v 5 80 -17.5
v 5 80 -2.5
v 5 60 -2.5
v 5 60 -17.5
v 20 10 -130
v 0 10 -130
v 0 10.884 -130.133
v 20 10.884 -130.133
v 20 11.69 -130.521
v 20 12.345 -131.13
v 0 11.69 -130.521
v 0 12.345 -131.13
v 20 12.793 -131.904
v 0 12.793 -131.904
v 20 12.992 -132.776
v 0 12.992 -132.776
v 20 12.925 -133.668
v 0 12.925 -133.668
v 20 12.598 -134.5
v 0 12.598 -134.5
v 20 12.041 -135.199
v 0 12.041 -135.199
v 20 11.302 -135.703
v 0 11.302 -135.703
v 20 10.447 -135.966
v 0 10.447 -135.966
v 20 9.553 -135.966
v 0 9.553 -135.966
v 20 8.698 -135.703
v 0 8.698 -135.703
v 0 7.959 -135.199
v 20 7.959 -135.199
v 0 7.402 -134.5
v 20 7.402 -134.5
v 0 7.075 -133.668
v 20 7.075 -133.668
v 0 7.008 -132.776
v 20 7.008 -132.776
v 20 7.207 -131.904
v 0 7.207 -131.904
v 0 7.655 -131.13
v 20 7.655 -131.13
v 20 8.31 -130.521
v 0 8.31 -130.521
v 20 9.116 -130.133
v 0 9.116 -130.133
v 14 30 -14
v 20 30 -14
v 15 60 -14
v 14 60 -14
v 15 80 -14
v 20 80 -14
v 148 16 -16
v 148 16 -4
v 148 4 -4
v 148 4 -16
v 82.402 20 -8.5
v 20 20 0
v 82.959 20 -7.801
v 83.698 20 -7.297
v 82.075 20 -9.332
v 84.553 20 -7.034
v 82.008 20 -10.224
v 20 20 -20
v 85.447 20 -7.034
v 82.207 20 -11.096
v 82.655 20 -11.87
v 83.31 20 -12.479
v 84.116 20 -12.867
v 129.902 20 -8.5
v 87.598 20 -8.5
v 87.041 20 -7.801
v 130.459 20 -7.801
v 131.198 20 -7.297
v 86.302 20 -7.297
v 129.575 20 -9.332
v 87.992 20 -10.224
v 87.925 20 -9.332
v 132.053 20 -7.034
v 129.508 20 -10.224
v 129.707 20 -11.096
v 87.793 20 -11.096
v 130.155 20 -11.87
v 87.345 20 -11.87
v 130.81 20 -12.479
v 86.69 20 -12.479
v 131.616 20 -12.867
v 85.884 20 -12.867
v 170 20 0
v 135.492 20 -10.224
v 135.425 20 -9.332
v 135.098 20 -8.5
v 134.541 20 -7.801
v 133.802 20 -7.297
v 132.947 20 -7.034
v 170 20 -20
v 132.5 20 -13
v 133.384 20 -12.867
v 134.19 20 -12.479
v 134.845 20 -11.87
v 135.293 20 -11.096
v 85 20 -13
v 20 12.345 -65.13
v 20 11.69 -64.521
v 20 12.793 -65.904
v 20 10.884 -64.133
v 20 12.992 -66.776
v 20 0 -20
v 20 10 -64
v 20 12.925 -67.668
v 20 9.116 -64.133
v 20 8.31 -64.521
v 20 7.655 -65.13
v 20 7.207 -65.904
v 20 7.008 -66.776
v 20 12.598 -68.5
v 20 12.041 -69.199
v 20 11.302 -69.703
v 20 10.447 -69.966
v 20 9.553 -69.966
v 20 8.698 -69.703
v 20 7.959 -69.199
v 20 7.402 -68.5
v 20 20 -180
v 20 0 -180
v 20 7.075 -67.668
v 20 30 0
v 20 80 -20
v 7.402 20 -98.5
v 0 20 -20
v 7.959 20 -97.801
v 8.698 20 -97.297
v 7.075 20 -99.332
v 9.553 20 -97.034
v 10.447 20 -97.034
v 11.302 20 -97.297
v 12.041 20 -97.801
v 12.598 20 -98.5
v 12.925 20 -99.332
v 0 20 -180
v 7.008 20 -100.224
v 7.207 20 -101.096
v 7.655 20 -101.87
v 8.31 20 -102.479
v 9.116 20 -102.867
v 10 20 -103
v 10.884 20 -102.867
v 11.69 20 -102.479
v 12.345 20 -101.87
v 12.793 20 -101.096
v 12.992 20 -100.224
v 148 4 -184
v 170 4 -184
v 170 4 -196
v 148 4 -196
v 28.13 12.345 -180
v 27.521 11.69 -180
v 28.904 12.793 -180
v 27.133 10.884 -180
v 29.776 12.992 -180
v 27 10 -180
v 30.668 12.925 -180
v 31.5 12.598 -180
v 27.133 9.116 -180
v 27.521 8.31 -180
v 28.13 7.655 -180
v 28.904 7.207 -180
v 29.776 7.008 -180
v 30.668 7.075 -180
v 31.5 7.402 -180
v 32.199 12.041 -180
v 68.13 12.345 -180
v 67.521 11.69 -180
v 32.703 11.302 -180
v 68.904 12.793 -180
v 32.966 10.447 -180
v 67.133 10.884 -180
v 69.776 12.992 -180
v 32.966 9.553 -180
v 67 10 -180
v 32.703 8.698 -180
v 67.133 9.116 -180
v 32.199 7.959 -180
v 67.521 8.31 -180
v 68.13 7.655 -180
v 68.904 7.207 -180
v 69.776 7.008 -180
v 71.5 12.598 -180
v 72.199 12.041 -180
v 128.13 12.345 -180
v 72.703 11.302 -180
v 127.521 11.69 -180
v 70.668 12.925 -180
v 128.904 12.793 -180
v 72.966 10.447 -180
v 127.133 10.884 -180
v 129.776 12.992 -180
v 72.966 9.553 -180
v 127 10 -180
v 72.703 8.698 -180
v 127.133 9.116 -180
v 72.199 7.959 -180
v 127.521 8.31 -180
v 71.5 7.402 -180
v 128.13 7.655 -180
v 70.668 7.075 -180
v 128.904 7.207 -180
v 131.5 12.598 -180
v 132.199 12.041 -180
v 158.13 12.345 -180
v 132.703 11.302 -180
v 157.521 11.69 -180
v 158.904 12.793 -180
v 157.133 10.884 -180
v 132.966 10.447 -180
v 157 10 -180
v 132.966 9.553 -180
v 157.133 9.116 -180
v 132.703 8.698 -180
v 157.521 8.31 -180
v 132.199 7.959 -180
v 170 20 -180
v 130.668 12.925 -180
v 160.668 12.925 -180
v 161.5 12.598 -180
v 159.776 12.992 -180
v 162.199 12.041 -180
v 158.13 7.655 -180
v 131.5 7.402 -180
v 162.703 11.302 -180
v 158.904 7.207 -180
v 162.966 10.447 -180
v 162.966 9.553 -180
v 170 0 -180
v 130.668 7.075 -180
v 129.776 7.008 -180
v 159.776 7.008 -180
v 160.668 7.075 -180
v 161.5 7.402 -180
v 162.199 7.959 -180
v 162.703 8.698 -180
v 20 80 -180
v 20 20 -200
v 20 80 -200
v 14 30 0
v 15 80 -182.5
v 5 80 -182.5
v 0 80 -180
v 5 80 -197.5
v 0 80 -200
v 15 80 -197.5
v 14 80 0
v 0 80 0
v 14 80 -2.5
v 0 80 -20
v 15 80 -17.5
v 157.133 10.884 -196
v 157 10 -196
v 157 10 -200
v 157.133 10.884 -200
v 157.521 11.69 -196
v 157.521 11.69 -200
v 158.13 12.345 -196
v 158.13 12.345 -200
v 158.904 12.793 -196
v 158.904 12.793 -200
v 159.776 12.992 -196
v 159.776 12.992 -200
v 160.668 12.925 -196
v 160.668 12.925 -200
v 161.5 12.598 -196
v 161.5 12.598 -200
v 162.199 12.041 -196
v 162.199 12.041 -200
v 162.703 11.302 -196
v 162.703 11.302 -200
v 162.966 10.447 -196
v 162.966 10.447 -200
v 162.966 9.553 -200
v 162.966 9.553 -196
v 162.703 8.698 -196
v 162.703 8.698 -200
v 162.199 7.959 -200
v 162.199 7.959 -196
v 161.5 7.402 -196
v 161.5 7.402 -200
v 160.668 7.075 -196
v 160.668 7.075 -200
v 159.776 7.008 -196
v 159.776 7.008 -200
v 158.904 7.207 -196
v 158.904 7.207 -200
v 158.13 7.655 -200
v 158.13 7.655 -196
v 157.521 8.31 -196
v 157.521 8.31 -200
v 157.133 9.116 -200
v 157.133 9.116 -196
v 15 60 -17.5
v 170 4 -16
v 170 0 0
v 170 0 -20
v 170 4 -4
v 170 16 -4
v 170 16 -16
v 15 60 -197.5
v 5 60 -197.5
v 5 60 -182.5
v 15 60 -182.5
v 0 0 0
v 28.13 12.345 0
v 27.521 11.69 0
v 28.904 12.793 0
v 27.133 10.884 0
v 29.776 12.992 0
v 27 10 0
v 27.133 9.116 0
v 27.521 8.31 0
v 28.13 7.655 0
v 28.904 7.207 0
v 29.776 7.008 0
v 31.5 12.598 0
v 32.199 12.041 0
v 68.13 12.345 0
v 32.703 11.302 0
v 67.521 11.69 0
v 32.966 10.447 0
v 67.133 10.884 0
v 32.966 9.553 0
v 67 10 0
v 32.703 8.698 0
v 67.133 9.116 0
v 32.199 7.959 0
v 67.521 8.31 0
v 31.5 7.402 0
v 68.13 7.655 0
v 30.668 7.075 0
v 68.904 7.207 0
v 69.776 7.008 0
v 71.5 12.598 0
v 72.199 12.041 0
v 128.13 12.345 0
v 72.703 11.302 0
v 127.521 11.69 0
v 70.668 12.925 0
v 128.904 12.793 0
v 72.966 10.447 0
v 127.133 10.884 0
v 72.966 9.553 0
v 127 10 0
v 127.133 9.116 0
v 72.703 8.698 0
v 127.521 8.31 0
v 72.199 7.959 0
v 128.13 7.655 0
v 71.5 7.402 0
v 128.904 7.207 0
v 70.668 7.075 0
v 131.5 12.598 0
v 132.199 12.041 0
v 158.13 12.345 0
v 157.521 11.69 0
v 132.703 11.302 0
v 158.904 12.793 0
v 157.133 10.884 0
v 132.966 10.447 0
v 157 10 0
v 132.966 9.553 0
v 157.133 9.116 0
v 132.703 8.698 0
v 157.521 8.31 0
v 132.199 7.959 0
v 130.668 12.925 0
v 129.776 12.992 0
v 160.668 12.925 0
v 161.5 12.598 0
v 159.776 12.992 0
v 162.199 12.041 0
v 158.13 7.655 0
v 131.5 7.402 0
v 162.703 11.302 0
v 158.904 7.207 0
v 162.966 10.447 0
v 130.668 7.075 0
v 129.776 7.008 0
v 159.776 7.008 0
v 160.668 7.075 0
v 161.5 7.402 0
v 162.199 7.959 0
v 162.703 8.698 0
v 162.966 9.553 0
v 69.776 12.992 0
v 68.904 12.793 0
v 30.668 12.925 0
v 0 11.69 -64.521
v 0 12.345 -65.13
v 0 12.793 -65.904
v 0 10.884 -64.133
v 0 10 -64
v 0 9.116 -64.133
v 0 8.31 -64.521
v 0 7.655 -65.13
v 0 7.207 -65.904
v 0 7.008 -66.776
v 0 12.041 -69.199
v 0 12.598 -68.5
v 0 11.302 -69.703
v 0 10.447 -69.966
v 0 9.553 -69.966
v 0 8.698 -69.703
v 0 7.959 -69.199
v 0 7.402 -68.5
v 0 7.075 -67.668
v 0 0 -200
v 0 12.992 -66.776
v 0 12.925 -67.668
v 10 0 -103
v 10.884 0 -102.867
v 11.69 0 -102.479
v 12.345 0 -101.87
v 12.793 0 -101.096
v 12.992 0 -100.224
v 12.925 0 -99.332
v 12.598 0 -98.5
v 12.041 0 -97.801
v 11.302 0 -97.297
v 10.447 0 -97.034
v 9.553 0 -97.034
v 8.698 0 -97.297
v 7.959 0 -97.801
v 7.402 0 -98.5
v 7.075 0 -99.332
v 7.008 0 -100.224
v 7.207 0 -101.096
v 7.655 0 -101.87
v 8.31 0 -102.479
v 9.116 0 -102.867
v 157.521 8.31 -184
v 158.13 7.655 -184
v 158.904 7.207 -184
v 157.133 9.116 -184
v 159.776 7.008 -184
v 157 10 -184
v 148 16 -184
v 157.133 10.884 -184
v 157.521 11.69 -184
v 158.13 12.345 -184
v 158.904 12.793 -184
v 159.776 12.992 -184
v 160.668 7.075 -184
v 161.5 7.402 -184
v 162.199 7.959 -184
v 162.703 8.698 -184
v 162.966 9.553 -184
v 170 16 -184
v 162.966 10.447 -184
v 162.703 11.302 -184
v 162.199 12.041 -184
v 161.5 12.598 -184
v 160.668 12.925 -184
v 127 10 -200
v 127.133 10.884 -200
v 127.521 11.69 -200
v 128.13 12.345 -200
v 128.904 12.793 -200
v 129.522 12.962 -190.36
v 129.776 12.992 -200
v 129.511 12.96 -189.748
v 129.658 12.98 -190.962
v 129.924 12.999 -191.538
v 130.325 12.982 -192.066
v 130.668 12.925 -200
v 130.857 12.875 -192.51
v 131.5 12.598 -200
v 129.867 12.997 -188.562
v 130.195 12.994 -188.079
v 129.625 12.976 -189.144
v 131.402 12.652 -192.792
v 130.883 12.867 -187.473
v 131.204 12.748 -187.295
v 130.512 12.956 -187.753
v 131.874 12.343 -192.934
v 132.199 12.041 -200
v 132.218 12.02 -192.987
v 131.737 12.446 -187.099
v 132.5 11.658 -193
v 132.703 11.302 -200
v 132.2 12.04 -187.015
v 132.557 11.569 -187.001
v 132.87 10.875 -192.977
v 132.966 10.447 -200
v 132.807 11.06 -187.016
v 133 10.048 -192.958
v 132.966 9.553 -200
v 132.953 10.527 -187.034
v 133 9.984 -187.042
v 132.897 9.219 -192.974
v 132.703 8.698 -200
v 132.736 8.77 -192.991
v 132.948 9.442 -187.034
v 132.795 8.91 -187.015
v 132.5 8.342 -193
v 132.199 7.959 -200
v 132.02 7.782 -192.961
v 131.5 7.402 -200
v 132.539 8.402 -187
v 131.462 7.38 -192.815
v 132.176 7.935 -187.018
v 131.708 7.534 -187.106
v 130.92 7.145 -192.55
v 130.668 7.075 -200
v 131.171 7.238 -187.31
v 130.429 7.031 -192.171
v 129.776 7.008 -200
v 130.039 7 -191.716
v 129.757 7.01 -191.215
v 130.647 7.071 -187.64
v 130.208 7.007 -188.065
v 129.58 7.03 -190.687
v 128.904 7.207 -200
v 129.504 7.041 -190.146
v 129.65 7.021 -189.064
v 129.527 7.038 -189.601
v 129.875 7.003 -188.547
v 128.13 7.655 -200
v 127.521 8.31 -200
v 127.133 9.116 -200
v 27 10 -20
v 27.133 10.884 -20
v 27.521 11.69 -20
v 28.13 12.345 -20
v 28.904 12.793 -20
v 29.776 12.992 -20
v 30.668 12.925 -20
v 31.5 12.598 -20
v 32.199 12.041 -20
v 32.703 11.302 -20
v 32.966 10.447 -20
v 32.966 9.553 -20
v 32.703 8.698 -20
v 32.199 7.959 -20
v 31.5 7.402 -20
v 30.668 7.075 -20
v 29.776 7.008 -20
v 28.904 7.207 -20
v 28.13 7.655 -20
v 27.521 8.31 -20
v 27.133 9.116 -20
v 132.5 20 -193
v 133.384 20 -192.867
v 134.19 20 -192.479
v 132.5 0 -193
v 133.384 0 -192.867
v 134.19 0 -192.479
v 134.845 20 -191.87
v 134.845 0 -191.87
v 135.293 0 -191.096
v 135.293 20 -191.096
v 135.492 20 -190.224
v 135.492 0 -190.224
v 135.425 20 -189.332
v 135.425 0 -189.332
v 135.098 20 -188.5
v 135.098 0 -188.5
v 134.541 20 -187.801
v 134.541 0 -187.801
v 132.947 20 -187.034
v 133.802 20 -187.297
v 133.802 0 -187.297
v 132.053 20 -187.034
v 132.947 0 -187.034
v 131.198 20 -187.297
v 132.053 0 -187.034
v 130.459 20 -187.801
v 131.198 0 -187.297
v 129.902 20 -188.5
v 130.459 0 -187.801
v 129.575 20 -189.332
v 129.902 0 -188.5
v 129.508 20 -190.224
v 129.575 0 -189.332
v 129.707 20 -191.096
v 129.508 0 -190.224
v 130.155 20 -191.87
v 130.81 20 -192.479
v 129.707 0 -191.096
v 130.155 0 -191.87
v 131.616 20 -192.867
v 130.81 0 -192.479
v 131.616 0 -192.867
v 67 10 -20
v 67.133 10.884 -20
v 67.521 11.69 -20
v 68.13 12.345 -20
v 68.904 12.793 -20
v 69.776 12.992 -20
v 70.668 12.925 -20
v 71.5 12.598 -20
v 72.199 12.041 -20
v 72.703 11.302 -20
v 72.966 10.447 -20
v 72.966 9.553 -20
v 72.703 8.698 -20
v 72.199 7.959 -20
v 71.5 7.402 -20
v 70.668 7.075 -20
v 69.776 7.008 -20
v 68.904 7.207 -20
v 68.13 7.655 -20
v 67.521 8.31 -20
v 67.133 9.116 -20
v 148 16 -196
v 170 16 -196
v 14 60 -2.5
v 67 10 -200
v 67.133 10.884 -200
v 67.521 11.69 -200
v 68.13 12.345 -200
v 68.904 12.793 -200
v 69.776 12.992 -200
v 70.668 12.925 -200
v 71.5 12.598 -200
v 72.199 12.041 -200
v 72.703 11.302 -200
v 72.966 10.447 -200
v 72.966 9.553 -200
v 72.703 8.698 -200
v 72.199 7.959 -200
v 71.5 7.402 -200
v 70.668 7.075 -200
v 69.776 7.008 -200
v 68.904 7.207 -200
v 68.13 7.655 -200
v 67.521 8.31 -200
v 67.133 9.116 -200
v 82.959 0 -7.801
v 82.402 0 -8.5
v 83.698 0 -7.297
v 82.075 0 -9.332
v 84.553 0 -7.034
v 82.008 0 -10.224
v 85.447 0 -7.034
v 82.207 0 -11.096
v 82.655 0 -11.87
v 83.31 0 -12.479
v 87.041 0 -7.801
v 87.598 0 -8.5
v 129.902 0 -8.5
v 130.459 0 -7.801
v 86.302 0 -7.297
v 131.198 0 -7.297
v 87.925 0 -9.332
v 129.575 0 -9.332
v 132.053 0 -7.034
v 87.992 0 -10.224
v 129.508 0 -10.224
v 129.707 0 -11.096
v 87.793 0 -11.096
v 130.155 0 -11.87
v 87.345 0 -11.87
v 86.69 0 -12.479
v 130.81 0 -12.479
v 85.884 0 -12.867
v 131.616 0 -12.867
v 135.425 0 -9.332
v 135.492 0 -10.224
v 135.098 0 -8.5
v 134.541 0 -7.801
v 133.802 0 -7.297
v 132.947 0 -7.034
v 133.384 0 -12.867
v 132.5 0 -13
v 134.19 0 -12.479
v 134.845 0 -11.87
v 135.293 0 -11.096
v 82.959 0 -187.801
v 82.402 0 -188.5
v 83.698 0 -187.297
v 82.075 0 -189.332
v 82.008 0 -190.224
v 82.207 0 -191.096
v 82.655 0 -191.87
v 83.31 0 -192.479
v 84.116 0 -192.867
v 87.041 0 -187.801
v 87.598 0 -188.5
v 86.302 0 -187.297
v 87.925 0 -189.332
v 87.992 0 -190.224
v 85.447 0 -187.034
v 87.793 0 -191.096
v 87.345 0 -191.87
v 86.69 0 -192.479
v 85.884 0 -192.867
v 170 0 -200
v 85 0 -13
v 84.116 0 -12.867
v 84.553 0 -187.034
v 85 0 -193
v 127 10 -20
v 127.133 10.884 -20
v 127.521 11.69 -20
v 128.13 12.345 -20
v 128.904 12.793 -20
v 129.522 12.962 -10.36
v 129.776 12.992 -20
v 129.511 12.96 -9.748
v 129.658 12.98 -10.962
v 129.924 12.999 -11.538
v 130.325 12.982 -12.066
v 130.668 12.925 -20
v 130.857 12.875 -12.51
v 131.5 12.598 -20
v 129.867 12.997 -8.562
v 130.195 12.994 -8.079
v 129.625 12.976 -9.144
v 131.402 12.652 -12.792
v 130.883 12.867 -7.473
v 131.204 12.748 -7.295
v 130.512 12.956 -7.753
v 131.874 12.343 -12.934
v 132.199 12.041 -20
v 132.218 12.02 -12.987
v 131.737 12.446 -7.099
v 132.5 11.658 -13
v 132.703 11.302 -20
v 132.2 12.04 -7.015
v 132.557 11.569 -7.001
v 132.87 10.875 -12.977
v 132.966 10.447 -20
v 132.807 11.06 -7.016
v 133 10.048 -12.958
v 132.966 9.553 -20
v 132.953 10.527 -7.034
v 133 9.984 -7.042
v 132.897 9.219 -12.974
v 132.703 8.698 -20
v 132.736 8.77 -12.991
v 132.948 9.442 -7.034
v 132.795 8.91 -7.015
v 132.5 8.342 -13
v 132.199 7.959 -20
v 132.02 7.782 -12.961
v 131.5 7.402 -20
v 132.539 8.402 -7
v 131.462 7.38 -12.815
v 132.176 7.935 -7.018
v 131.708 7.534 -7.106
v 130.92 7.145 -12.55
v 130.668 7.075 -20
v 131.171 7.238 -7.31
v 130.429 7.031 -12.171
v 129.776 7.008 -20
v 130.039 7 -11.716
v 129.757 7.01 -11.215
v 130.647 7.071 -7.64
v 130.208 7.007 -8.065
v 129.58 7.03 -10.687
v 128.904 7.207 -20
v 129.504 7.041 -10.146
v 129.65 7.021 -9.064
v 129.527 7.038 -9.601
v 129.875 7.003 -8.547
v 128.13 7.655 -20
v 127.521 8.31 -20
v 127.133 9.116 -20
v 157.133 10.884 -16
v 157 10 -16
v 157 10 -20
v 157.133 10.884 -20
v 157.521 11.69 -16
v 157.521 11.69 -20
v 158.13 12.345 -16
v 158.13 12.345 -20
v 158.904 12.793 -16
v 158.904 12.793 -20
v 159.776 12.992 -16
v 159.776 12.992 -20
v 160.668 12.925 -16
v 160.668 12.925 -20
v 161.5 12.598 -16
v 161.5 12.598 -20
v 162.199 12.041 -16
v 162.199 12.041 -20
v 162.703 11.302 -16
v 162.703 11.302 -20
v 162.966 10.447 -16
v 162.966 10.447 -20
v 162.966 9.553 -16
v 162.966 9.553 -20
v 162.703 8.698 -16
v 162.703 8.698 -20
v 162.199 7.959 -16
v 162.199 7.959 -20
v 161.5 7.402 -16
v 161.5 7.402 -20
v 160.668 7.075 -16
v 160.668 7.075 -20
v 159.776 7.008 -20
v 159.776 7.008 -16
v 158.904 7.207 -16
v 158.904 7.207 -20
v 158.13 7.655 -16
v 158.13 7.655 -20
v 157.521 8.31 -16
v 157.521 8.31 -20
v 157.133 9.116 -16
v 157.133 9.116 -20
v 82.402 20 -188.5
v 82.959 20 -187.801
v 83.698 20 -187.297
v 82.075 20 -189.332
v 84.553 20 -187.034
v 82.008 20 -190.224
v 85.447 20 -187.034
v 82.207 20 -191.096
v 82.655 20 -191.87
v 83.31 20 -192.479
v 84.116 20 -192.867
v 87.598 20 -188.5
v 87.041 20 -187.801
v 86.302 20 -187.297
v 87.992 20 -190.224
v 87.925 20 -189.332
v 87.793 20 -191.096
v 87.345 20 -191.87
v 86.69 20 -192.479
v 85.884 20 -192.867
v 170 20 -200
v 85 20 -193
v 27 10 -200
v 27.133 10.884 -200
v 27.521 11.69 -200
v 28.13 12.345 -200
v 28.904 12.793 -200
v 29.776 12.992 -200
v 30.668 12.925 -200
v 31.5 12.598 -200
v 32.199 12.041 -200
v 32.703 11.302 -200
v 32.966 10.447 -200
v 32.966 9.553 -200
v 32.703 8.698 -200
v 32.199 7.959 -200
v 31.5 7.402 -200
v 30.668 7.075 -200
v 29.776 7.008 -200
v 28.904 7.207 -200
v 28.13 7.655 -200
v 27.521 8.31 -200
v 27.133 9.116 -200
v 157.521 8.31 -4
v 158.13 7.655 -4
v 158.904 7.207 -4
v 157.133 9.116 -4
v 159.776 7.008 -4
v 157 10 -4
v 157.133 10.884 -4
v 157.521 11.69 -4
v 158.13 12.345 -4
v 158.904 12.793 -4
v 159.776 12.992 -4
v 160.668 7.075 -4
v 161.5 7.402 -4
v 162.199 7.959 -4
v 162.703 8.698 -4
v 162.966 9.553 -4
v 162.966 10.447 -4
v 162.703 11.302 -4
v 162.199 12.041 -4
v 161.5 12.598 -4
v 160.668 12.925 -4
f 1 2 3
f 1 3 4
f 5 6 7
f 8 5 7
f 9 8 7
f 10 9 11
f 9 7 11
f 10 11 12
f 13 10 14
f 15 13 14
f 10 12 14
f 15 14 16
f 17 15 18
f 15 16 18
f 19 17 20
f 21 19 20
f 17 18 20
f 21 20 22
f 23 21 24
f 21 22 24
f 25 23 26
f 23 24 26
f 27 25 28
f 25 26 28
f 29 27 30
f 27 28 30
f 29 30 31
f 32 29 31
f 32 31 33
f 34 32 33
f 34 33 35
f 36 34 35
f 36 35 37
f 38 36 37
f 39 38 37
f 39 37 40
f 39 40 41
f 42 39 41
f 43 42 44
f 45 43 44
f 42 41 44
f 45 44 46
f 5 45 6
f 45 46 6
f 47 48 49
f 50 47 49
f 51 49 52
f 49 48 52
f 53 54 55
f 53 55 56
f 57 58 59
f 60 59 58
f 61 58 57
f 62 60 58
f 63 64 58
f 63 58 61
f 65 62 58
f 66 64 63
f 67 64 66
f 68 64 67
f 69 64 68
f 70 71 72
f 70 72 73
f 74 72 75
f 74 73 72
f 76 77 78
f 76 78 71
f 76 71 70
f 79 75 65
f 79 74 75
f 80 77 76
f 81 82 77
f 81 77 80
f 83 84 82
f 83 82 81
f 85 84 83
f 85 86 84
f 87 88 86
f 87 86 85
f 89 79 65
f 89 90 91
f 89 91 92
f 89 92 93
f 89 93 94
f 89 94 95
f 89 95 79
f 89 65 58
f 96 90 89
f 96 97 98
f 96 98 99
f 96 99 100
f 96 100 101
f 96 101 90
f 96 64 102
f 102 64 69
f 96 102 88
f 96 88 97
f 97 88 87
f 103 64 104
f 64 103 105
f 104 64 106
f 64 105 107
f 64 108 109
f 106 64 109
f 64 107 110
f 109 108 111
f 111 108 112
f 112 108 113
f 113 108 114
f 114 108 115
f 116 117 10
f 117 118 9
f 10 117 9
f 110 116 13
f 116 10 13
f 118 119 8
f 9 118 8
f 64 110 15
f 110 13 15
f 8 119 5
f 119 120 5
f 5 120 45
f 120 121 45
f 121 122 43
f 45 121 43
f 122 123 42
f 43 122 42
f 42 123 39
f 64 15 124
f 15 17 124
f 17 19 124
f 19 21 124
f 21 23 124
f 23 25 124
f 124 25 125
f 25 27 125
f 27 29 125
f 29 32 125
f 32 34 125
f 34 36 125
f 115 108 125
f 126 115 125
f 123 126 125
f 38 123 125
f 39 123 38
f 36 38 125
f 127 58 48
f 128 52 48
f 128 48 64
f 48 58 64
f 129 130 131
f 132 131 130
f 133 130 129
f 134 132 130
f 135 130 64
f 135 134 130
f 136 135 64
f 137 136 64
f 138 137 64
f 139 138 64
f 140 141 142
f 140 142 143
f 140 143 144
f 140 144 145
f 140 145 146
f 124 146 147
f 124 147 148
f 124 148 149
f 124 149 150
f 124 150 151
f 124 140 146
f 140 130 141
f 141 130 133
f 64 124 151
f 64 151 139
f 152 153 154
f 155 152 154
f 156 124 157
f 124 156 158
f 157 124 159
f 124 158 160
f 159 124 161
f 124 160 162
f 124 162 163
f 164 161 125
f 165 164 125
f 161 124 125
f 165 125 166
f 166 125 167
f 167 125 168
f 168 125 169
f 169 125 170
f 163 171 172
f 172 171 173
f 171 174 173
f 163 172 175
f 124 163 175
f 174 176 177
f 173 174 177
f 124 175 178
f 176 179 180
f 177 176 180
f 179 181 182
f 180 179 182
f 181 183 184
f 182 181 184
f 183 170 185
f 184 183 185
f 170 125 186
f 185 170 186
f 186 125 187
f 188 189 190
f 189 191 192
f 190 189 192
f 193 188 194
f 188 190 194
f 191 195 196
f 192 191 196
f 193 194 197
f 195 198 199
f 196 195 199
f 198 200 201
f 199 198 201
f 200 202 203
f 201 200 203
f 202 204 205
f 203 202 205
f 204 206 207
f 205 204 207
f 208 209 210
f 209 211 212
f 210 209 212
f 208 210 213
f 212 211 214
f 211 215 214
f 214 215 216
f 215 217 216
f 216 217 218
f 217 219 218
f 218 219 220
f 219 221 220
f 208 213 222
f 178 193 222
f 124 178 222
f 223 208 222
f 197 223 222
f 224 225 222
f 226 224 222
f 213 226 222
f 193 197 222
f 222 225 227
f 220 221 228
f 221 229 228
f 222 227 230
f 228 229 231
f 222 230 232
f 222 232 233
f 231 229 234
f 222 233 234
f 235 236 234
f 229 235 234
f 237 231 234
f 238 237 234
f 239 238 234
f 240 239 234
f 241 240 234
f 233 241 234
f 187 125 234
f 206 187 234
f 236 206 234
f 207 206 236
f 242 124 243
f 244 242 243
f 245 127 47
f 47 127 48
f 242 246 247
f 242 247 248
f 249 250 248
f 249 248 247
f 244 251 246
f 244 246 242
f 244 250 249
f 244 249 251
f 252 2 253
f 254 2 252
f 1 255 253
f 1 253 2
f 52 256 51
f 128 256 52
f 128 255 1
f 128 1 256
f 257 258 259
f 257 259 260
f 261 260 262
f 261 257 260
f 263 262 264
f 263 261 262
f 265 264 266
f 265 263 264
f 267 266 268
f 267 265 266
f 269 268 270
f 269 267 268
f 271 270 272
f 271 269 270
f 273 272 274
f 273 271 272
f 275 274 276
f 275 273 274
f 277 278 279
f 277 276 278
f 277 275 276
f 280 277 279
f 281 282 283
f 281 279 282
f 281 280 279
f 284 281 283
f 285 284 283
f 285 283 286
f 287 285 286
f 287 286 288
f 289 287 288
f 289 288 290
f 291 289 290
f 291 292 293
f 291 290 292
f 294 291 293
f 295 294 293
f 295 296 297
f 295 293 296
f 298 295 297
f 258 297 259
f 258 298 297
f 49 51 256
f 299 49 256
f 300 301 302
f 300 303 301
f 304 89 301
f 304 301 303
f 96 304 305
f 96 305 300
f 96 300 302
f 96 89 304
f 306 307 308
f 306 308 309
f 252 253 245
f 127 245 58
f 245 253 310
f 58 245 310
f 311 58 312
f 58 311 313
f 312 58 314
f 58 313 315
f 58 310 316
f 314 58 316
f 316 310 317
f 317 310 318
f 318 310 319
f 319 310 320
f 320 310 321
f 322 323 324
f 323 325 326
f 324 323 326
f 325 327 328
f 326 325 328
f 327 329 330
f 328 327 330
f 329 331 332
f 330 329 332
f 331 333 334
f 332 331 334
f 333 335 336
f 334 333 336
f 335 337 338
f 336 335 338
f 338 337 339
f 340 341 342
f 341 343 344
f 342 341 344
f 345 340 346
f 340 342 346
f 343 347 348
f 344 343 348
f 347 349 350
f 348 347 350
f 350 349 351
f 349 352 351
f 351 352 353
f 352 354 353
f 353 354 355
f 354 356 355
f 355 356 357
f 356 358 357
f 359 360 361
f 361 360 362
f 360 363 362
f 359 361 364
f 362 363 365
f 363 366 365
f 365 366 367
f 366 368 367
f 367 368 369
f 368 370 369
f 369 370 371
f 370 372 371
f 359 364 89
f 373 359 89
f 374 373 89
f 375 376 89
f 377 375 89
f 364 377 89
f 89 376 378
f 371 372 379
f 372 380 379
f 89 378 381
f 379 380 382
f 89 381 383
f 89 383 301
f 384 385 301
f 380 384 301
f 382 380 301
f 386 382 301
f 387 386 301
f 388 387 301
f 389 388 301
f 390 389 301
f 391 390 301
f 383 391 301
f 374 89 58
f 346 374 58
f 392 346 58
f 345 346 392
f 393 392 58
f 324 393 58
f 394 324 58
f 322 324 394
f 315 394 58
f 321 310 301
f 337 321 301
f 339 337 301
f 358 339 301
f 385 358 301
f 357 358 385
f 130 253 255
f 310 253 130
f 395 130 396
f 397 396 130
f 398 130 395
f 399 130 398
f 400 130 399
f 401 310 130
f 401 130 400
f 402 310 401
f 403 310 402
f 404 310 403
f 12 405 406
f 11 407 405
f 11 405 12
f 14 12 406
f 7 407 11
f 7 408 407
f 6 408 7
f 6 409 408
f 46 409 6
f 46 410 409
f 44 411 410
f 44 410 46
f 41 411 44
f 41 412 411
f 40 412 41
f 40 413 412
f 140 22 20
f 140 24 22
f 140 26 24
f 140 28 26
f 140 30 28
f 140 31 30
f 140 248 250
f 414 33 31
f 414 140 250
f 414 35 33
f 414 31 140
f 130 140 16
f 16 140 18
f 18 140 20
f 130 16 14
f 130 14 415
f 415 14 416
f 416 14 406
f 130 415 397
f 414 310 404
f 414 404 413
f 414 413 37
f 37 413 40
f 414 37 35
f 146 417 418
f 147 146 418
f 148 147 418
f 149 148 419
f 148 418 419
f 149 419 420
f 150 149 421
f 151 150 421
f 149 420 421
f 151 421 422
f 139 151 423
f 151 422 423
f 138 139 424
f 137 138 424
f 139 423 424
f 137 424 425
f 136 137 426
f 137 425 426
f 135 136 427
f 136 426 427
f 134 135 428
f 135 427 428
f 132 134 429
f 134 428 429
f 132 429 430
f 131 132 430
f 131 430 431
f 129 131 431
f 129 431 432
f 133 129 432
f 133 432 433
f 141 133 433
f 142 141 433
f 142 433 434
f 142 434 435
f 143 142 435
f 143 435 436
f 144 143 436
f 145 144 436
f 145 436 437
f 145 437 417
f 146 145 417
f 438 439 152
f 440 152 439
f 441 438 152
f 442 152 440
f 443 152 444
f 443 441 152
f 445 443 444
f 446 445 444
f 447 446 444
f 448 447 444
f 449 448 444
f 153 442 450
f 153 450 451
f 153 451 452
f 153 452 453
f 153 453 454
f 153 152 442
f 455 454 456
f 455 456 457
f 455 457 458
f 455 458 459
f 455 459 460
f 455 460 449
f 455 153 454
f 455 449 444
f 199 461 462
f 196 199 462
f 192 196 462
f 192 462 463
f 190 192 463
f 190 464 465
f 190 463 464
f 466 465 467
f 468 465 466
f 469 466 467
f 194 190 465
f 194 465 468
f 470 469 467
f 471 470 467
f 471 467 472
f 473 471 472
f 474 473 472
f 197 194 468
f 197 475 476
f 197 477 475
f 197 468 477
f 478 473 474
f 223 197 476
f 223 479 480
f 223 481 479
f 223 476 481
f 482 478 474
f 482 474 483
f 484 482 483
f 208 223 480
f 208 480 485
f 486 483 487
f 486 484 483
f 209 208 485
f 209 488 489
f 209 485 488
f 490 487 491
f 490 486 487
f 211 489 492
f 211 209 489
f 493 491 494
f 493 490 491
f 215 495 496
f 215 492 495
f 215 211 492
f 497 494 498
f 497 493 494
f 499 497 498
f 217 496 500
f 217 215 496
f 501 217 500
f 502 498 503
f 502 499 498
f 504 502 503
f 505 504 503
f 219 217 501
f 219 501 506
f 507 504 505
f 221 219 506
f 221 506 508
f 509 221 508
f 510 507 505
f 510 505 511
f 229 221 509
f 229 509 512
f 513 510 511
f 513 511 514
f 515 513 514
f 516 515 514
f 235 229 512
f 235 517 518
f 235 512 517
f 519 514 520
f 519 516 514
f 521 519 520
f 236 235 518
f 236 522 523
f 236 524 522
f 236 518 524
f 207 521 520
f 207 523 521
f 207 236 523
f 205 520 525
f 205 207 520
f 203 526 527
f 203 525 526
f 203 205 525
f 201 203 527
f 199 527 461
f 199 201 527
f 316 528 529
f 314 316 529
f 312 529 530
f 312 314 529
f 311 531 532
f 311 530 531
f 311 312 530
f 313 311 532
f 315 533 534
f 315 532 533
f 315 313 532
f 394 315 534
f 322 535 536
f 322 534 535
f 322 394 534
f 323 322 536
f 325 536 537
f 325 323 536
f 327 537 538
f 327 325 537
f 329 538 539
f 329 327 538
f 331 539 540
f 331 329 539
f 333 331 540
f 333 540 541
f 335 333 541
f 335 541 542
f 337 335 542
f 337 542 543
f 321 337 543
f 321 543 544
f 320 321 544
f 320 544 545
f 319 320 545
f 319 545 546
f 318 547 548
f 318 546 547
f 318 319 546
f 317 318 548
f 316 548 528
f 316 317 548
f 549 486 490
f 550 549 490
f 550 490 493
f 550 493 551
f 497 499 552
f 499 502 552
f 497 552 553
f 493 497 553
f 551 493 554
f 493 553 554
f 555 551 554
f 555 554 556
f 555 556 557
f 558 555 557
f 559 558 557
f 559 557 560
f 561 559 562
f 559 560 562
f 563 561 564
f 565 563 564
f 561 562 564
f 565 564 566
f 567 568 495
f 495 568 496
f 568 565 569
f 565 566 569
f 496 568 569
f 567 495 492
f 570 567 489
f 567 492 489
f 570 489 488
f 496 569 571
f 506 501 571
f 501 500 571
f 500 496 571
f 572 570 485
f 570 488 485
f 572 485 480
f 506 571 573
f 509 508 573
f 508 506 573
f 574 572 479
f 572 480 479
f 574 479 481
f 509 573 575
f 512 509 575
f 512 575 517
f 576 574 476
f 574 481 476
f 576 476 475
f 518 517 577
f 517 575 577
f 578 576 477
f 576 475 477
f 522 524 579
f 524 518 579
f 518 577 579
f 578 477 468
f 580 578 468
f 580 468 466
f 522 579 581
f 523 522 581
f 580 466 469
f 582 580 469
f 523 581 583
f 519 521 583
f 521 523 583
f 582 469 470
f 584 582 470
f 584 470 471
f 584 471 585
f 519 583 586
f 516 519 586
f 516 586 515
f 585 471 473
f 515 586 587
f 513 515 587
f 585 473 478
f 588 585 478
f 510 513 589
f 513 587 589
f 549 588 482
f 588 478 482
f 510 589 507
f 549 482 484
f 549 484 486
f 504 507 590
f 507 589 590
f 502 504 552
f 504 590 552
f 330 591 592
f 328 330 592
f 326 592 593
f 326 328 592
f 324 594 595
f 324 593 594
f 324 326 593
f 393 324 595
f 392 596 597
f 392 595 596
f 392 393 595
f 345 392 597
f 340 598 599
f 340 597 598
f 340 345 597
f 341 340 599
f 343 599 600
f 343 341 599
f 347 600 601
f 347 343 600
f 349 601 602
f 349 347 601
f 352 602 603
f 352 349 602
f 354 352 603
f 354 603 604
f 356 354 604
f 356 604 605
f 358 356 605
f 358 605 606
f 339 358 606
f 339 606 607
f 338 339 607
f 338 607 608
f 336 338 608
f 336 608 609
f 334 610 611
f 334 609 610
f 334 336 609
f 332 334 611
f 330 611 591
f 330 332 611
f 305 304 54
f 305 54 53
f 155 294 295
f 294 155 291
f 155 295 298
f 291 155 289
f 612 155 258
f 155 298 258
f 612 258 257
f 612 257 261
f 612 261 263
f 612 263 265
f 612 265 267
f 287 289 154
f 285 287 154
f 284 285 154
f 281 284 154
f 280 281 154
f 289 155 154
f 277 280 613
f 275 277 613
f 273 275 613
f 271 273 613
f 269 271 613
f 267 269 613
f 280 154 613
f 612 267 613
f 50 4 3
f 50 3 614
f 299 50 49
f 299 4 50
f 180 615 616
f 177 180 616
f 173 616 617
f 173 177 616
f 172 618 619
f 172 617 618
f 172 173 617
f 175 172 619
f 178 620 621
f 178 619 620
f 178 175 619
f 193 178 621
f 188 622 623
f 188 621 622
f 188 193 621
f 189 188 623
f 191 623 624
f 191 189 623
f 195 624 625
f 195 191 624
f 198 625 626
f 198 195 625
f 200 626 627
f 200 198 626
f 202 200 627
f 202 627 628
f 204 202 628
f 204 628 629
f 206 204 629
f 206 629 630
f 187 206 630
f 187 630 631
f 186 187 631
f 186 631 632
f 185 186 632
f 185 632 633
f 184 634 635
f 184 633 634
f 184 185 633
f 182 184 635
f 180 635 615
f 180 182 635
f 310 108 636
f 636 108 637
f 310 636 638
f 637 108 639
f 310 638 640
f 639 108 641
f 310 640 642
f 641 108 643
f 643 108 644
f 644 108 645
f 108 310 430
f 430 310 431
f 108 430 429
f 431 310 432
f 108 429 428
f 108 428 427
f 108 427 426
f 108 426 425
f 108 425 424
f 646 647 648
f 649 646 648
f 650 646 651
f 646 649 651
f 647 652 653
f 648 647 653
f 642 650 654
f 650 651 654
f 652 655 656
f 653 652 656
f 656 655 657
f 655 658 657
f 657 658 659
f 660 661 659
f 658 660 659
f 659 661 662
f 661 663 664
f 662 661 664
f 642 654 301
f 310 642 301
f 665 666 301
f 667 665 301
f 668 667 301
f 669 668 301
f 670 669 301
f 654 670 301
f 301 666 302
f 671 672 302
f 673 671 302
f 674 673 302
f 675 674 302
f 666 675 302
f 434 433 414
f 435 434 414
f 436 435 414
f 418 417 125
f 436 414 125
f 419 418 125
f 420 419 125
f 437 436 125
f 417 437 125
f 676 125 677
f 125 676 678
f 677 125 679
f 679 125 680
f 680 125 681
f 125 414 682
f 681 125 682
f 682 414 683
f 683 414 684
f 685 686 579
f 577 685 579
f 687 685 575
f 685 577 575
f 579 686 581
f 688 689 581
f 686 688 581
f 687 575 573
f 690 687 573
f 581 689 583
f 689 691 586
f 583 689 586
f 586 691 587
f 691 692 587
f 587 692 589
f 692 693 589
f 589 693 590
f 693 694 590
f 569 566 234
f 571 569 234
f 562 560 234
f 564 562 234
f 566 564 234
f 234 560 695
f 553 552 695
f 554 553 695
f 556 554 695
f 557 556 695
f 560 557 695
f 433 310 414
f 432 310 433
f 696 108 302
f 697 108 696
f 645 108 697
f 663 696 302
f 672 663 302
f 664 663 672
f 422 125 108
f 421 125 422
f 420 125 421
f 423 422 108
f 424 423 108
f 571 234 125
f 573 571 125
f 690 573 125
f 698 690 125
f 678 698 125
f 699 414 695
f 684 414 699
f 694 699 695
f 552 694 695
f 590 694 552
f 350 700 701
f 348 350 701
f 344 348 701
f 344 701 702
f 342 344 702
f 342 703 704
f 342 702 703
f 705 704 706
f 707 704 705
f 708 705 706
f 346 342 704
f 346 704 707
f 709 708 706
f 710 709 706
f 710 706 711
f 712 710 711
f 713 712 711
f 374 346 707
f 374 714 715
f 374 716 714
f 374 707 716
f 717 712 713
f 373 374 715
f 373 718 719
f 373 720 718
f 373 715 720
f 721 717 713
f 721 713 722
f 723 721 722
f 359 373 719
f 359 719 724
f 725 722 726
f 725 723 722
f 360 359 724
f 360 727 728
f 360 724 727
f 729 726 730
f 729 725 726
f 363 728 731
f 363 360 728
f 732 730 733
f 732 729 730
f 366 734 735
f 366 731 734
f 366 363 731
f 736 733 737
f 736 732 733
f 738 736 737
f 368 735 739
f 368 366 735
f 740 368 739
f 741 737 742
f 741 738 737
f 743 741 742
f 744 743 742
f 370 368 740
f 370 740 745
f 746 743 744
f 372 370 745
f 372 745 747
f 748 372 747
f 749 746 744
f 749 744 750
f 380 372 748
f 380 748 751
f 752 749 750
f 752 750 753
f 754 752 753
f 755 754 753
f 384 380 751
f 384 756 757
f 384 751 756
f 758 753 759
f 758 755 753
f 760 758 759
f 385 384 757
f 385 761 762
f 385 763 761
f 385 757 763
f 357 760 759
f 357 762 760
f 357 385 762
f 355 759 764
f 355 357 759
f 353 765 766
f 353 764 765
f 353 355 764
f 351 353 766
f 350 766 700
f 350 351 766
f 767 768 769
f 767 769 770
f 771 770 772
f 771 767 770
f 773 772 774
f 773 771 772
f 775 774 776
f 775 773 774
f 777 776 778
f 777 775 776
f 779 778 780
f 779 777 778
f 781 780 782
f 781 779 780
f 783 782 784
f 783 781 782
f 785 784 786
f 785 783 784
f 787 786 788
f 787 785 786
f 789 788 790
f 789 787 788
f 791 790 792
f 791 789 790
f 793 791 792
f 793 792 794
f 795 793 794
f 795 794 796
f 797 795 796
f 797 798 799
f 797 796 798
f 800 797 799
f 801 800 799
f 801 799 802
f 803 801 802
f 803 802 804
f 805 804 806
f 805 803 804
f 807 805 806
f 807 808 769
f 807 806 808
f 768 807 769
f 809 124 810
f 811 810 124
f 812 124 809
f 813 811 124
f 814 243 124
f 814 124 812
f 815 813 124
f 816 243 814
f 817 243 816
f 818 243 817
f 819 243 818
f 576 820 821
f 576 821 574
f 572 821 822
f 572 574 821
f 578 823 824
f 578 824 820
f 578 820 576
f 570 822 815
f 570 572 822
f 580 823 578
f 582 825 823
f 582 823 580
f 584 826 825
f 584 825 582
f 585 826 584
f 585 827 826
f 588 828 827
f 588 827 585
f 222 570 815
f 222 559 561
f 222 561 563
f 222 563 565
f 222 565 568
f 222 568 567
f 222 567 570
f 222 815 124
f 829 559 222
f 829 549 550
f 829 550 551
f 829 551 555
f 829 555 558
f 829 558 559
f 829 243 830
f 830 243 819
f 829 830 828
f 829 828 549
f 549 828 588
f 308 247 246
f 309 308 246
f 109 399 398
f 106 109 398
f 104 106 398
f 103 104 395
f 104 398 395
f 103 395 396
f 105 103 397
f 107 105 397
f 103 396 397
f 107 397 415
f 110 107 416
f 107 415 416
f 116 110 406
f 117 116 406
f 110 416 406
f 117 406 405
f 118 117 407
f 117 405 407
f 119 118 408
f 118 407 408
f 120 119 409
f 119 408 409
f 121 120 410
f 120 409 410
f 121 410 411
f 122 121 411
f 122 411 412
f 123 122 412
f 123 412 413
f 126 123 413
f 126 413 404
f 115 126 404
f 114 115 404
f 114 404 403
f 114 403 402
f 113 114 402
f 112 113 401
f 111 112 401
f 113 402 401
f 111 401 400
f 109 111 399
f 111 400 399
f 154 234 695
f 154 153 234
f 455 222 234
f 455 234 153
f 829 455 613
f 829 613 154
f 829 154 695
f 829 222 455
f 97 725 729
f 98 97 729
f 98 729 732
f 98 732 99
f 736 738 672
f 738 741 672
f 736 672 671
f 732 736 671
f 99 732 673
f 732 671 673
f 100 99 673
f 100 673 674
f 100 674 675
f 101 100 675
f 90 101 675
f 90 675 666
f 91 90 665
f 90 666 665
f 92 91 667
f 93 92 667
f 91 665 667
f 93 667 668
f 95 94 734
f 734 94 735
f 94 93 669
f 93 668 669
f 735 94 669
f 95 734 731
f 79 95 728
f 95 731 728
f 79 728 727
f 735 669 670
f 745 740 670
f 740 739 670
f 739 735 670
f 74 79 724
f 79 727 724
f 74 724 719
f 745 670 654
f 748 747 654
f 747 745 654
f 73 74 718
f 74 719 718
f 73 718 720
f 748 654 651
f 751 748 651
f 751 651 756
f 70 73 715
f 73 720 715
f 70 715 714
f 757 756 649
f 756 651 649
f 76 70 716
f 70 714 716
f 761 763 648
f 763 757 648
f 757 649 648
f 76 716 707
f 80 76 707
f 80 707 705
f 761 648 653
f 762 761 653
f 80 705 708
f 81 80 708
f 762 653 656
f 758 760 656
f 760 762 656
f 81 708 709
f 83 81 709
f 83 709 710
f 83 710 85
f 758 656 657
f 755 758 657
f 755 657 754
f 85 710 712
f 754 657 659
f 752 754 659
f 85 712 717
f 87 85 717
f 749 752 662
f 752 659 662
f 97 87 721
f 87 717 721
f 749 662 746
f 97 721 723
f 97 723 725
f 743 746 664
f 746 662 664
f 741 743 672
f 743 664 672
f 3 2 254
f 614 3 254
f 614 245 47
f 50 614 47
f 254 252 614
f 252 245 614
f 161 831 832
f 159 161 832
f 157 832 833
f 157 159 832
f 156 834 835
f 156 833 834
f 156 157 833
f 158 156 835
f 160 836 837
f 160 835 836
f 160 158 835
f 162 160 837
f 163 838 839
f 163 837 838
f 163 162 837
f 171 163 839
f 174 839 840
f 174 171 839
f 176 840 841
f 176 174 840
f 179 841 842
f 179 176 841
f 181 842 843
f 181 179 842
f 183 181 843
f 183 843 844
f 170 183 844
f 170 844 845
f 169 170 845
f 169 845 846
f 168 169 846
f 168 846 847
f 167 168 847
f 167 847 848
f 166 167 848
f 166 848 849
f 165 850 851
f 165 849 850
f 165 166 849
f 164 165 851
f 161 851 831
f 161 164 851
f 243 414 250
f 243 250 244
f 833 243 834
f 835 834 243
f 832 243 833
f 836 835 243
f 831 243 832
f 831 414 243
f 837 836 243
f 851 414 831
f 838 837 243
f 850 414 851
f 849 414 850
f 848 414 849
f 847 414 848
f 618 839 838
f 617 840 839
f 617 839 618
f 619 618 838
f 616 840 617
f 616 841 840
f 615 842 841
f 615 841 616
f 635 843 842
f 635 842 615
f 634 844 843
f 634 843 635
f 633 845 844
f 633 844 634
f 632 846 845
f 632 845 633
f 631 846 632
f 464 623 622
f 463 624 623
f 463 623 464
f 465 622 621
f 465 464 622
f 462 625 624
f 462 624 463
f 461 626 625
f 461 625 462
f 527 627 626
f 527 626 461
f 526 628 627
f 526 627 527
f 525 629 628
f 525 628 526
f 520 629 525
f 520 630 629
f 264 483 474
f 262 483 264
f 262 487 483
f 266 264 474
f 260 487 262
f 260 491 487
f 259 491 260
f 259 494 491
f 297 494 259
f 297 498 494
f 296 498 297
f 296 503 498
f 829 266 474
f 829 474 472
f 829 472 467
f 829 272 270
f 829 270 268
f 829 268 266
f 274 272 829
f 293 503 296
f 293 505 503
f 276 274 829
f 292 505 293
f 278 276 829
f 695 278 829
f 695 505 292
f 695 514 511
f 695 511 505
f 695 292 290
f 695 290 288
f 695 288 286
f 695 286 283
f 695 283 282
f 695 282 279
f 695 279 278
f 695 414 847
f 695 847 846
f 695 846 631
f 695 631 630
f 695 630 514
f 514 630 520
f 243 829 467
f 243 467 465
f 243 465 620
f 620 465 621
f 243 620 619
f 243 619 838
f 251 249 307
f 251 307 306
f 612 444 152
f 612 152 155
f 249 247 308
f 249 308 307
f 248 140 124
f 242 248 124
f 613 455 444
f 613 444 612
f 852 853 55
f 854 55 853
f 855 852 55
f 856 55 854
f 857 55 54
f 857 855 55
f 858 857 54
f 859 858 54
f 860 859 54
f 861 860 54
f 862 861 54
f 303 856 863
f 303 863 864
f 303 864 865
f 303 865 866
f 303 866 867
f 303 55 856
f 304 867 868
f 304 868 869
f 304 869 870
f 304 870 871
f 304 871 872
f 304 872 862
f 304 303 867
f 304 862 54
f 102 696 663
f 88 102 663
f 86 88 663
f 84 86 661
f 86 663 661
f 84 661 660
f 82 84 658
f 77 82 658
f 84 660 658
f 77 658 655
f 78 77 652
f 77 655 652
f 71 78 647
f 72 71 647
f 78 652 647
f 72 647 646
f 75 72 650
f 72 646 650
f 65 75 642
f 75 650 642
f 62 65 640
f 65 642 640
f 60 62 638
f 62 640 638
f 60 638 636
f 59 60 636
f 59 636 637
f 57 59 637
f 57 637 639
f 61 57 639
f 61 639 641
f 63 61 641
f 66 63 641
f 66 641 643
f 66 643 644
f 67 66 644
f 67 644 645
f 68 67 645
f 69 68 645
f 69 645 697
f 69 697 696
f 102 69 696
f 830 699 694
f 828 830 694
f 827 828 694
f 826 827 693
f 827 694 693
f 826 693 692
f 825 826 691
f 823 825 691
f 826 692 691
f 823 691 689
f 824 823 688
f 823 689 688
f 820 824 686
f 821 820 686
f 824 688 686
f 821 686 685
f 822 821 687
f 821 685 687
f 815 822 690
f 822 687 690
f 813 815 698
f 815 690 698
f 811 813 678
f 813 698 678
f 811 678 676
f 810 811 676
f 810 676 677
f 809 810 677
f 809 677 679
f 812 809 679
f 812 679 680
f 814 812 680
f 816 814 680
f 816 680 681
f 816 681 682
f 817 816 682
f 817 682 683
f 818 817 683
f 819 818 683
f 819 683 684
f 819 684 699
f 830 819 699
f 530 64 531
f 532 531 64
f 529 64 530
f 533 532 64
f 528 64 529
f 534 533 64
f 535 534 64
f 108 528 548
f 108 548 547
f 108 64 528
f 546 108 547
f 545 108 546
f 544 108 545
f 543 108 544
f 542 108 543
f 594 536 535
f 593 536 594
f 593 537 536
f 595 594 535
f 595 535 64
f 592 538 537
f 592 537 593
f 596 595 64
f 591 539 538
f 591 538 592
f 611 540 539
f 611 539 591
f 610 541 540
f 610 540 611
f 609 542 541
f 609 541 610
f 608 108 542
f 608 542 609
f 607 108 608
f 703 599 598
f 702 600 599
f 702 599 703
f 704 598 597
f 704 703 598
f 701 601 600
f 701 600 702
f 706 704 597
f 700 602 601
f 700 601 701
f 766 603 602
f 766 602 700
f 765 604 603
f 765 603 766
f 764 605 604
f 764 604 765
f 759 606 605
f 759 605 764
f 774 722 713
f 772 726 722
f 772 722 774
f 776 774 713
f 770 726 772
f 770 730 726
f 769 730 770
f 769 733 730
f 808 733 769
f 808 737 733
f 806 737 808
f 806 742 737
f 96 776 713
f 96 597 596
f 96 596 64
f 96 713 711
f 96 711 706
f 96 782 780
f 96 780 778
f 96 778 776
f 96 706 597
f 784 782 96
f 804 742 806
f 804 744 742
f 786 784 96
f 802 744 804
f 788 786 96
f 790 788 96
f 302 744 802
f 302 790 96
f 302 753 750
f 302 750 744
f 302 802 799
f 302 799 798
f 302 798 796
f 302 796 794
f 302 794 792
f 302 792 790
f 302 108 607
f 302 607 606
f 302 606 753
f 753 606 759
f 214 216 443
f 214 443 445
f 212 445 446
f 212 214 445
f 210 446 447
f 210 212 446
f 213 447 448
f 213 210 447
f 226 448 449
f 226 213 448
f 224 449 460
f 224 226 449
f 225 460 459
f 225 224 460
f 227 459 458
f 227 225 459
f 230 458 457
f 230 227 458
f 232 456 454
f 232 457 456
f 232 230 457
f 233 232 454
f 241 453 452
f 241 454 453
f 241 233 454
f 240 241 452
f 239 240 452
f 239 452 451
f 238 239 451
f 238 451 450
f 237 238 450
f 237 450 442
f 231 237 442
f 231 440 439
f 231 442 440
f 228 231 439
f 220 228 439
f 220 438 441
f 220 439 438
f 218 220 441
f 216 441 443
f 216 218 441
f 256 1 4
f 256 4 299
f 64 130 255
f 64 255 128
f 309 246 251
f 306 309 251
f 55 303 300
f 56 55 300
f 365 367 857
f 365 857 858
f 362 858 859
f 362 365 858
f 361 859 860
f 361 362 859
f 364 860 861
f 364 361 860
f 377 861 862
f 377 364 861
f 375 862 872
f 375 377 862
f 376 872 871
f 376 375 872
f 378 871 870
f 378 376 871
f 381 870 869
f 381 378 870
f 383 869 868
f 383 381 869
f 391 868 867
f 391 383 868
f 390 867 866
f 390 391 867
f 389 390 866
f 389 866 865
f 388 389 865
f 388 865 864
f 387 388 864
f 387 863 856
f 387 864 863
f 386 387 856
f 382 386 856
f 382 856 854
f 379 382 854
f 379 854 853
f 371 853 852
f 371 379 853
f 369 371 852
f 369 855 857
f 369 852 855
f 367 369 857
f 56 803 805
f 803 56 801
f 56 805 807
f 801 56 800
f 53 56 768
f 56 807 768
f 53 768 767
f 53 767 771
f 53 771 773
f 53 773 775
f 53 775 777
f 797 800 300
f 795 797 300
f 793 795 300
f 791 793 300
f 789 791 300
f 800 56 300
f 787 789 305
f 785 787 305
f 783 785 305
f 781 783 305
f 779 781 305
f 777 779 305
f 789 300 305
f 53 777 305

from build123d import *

# Parameters (mm, degrees)
SKETCH1_W               = 320
SKETCH1_H               = 200
SKETCH1_W_2             = 280
SKETCH1_H_2             = 160
BOSS_EXTRUDE1_DEPTH     = 20
SKETCH2_W               = 150
SKETCH2_H               = 200
CUT_EXTRUDE1_DEPTH      = 20
SKETCH3_W               = 20
SKETCH3_H               = 20
BOSS_EXTRUDE2_DEPTH     = 60
SKETCH4_W               = 10
SKETCH4_H               = 15
CUT_EXTRUDE2_DEPTH      = 20
SKETCH5_W               = 12
SKETCH5_H               = 12
CUT_EXTRUDE3_DEPTH      = 22
CUT_EXTRUDE5_DEPTH      = 275.40845468
CUT_EXTRUDE5_DEPTH_BACK = 275.40845468
SKETCH8_R               = 3
SKETCH10_R              = 3
CUT_EXTRUDE6_DEPTH      = 30
SKETCH11_W              = 14
SKETCH11_H              = 50
CUT_EXTRUDE7_DEPTH      = 6
SKETCH12_R              = 3
CUT_EXTRUDE8_DEPTH      = 20


with BuildPart() as part:
    # Sketch1 → Boss-Extrude1 (new body)
    with BuildSketch(Plane(origin=(0, 0, 0), x_dir=(1, 0, 0), z_dir=(0, 1, 0))):
        with Locations((160, 100)):
            Rectangle(SKETCH1_W, SKETCH1_H)
        with Locations((160, 100)):
            Rectangle(SKETCH1_W_2, SKETCH1_H_2, mode=Mode.SUBTRACT)
    extrude(amount=BOSS_EXTRUDE1_DEPTH)

    # Sketch2 → Cut-Extrude1 (cut)
    with BuildSketch(Plane(origin=(0, 20, 0), x_dir=(1, 0, 0), z_dir=(0, 1, 0))):
        with Locations((245, 100)):
            Rectangle(SKETCH2_W, SKETCH2_H)
    extrude(amount=-CUT_EXTRUDE1_DEPTH, mode=Mode.SUBTRACT)

    # Sketch3 → Boss-Extrude2 (add)
    with BuildSketch(Plane(origin=(0, 20, 0), x_dir=(1, 0, 0), z_dir=(0, 1, 0))):
        with Locations((10, 10)):
            Rectangle(SKETCH3_W, SKETCH3_H)
        with Locations((10, 190)):
            Rectangle(SKETCH3_W, SKETCH3_H)
    extrude(amount=BOSS_EXTRUDE2_DEPTH)

    # Sketch4 → Cut-Extrude2 (cut)
    with BuildSketch(Plane(origin=(0, 80, 0), x_dir=(1, 0, 0), z_dir=(0, 1, 0))):
        with Locations((10, 10)):
            Rectangle(SKETCH4_W, SKETCH4_H)
        with Locations((10, 190)):
            Rectangle(SKETCH4_W, SKETCH4_H)
    extrude(amount=-CUT_EXTRUDE2_DEPTH, mode=Mode.SUBTRACT)

    # Sketch5 → Cut-Extrude3 (cut)
    with BuildSketch(Plane(origin=(170, 0, 0), x_dir=(0, 0, -1), z_dir=(1, 0, 0))):
        with Locations((10, 10)):
            Rectangle(SKETCH5_W, SKETCH5_H)
        with Locations((190, 10)):
            Rectangle(SKETCH5_W, SKETCH5_H)
    extrude(amount=-CUT_EXTRUDE3_DEPTH, mode=Mode.SUBTRACT)

    # Sketch8 → Cut-Extrude5 (cut, two sides: drawn at the far end of the back side and taken through both)
    with BuildSketch(Plane(origin=(0, 0, -200), x_dir=(-1, 0, 0), z_dir=(0, 0, -1)).offset(-CUT_EXTRUDE5_DEPTH_BACK)):
        with Locations((-30, 10)):
            Circle(SKETCH8_R)
        with Locations((-160, 10)):
            Circle(SKETCH8_R)
        with Locations((-70, 10)):
            Circle(SKETCH8_R)
        with Locations((-130, 10)):
            Circle(SKETCH8_R)
    extrude(amount=CUT_EXTRUDE5_DEPTH + CUT_EXTRUDE5_DEPTH_BACK, mode=Mode.SUBTRACT)

    # Sketch10 → Cut-Extrude6 (cut)
    with BuildSketch(Plane.XZ):
        with Locations(Location((132.5, -10, 0), (0, 0, 270))):
            Circle(SKETCH10_R)
        with Locations(Location((85, -10, 0), (0, 0, 270))):
            Circle(SKETCH10_R)
        with Locations(Location((10, -100, 0), (0, 0, 270))):
            Circle(SKETCH10_R)
        with Locations(Location((132.5, -190, 0), (0, 0, 270))):
            Circle(SKETCH10_R)
        with Locations(Location((85, -190, 0), (0, 0, 270))):
            Circle(SKETCH10_R)
    extrude(amount=-CUT_EXTRUDE6_DEPTH, mode=Mode.SUBTRACT)

    # Sketch11 → Cut-Extrude7 (cut)
    with BuildSketch(Plane(origin=(20, 0, 0), x_dir=(0, 0, -1), z_dir=(1, 0, 0))):
        with Locations((7, 55)):
            Rectangle(SKETCH11_W, SKETCH11_H)
    extrude(amount=-CUT_EXTRUDE7_DEPTH, mode=Mode.SUBTRACT)

    # Sketch12 → Cut-Extrude8 (cut)
    with BuildSketch(Plane.ZY):
        with Locations((-133, 10)):
            Circle(SKETCH12_R)
        with Locations((-67, 10)):
            Circle(SKETCH12_R)
    extrude(amount=-CUT_EXTRUDE8_DEPTH, mode=Mode.SUBTRACT)


solid = part.part
